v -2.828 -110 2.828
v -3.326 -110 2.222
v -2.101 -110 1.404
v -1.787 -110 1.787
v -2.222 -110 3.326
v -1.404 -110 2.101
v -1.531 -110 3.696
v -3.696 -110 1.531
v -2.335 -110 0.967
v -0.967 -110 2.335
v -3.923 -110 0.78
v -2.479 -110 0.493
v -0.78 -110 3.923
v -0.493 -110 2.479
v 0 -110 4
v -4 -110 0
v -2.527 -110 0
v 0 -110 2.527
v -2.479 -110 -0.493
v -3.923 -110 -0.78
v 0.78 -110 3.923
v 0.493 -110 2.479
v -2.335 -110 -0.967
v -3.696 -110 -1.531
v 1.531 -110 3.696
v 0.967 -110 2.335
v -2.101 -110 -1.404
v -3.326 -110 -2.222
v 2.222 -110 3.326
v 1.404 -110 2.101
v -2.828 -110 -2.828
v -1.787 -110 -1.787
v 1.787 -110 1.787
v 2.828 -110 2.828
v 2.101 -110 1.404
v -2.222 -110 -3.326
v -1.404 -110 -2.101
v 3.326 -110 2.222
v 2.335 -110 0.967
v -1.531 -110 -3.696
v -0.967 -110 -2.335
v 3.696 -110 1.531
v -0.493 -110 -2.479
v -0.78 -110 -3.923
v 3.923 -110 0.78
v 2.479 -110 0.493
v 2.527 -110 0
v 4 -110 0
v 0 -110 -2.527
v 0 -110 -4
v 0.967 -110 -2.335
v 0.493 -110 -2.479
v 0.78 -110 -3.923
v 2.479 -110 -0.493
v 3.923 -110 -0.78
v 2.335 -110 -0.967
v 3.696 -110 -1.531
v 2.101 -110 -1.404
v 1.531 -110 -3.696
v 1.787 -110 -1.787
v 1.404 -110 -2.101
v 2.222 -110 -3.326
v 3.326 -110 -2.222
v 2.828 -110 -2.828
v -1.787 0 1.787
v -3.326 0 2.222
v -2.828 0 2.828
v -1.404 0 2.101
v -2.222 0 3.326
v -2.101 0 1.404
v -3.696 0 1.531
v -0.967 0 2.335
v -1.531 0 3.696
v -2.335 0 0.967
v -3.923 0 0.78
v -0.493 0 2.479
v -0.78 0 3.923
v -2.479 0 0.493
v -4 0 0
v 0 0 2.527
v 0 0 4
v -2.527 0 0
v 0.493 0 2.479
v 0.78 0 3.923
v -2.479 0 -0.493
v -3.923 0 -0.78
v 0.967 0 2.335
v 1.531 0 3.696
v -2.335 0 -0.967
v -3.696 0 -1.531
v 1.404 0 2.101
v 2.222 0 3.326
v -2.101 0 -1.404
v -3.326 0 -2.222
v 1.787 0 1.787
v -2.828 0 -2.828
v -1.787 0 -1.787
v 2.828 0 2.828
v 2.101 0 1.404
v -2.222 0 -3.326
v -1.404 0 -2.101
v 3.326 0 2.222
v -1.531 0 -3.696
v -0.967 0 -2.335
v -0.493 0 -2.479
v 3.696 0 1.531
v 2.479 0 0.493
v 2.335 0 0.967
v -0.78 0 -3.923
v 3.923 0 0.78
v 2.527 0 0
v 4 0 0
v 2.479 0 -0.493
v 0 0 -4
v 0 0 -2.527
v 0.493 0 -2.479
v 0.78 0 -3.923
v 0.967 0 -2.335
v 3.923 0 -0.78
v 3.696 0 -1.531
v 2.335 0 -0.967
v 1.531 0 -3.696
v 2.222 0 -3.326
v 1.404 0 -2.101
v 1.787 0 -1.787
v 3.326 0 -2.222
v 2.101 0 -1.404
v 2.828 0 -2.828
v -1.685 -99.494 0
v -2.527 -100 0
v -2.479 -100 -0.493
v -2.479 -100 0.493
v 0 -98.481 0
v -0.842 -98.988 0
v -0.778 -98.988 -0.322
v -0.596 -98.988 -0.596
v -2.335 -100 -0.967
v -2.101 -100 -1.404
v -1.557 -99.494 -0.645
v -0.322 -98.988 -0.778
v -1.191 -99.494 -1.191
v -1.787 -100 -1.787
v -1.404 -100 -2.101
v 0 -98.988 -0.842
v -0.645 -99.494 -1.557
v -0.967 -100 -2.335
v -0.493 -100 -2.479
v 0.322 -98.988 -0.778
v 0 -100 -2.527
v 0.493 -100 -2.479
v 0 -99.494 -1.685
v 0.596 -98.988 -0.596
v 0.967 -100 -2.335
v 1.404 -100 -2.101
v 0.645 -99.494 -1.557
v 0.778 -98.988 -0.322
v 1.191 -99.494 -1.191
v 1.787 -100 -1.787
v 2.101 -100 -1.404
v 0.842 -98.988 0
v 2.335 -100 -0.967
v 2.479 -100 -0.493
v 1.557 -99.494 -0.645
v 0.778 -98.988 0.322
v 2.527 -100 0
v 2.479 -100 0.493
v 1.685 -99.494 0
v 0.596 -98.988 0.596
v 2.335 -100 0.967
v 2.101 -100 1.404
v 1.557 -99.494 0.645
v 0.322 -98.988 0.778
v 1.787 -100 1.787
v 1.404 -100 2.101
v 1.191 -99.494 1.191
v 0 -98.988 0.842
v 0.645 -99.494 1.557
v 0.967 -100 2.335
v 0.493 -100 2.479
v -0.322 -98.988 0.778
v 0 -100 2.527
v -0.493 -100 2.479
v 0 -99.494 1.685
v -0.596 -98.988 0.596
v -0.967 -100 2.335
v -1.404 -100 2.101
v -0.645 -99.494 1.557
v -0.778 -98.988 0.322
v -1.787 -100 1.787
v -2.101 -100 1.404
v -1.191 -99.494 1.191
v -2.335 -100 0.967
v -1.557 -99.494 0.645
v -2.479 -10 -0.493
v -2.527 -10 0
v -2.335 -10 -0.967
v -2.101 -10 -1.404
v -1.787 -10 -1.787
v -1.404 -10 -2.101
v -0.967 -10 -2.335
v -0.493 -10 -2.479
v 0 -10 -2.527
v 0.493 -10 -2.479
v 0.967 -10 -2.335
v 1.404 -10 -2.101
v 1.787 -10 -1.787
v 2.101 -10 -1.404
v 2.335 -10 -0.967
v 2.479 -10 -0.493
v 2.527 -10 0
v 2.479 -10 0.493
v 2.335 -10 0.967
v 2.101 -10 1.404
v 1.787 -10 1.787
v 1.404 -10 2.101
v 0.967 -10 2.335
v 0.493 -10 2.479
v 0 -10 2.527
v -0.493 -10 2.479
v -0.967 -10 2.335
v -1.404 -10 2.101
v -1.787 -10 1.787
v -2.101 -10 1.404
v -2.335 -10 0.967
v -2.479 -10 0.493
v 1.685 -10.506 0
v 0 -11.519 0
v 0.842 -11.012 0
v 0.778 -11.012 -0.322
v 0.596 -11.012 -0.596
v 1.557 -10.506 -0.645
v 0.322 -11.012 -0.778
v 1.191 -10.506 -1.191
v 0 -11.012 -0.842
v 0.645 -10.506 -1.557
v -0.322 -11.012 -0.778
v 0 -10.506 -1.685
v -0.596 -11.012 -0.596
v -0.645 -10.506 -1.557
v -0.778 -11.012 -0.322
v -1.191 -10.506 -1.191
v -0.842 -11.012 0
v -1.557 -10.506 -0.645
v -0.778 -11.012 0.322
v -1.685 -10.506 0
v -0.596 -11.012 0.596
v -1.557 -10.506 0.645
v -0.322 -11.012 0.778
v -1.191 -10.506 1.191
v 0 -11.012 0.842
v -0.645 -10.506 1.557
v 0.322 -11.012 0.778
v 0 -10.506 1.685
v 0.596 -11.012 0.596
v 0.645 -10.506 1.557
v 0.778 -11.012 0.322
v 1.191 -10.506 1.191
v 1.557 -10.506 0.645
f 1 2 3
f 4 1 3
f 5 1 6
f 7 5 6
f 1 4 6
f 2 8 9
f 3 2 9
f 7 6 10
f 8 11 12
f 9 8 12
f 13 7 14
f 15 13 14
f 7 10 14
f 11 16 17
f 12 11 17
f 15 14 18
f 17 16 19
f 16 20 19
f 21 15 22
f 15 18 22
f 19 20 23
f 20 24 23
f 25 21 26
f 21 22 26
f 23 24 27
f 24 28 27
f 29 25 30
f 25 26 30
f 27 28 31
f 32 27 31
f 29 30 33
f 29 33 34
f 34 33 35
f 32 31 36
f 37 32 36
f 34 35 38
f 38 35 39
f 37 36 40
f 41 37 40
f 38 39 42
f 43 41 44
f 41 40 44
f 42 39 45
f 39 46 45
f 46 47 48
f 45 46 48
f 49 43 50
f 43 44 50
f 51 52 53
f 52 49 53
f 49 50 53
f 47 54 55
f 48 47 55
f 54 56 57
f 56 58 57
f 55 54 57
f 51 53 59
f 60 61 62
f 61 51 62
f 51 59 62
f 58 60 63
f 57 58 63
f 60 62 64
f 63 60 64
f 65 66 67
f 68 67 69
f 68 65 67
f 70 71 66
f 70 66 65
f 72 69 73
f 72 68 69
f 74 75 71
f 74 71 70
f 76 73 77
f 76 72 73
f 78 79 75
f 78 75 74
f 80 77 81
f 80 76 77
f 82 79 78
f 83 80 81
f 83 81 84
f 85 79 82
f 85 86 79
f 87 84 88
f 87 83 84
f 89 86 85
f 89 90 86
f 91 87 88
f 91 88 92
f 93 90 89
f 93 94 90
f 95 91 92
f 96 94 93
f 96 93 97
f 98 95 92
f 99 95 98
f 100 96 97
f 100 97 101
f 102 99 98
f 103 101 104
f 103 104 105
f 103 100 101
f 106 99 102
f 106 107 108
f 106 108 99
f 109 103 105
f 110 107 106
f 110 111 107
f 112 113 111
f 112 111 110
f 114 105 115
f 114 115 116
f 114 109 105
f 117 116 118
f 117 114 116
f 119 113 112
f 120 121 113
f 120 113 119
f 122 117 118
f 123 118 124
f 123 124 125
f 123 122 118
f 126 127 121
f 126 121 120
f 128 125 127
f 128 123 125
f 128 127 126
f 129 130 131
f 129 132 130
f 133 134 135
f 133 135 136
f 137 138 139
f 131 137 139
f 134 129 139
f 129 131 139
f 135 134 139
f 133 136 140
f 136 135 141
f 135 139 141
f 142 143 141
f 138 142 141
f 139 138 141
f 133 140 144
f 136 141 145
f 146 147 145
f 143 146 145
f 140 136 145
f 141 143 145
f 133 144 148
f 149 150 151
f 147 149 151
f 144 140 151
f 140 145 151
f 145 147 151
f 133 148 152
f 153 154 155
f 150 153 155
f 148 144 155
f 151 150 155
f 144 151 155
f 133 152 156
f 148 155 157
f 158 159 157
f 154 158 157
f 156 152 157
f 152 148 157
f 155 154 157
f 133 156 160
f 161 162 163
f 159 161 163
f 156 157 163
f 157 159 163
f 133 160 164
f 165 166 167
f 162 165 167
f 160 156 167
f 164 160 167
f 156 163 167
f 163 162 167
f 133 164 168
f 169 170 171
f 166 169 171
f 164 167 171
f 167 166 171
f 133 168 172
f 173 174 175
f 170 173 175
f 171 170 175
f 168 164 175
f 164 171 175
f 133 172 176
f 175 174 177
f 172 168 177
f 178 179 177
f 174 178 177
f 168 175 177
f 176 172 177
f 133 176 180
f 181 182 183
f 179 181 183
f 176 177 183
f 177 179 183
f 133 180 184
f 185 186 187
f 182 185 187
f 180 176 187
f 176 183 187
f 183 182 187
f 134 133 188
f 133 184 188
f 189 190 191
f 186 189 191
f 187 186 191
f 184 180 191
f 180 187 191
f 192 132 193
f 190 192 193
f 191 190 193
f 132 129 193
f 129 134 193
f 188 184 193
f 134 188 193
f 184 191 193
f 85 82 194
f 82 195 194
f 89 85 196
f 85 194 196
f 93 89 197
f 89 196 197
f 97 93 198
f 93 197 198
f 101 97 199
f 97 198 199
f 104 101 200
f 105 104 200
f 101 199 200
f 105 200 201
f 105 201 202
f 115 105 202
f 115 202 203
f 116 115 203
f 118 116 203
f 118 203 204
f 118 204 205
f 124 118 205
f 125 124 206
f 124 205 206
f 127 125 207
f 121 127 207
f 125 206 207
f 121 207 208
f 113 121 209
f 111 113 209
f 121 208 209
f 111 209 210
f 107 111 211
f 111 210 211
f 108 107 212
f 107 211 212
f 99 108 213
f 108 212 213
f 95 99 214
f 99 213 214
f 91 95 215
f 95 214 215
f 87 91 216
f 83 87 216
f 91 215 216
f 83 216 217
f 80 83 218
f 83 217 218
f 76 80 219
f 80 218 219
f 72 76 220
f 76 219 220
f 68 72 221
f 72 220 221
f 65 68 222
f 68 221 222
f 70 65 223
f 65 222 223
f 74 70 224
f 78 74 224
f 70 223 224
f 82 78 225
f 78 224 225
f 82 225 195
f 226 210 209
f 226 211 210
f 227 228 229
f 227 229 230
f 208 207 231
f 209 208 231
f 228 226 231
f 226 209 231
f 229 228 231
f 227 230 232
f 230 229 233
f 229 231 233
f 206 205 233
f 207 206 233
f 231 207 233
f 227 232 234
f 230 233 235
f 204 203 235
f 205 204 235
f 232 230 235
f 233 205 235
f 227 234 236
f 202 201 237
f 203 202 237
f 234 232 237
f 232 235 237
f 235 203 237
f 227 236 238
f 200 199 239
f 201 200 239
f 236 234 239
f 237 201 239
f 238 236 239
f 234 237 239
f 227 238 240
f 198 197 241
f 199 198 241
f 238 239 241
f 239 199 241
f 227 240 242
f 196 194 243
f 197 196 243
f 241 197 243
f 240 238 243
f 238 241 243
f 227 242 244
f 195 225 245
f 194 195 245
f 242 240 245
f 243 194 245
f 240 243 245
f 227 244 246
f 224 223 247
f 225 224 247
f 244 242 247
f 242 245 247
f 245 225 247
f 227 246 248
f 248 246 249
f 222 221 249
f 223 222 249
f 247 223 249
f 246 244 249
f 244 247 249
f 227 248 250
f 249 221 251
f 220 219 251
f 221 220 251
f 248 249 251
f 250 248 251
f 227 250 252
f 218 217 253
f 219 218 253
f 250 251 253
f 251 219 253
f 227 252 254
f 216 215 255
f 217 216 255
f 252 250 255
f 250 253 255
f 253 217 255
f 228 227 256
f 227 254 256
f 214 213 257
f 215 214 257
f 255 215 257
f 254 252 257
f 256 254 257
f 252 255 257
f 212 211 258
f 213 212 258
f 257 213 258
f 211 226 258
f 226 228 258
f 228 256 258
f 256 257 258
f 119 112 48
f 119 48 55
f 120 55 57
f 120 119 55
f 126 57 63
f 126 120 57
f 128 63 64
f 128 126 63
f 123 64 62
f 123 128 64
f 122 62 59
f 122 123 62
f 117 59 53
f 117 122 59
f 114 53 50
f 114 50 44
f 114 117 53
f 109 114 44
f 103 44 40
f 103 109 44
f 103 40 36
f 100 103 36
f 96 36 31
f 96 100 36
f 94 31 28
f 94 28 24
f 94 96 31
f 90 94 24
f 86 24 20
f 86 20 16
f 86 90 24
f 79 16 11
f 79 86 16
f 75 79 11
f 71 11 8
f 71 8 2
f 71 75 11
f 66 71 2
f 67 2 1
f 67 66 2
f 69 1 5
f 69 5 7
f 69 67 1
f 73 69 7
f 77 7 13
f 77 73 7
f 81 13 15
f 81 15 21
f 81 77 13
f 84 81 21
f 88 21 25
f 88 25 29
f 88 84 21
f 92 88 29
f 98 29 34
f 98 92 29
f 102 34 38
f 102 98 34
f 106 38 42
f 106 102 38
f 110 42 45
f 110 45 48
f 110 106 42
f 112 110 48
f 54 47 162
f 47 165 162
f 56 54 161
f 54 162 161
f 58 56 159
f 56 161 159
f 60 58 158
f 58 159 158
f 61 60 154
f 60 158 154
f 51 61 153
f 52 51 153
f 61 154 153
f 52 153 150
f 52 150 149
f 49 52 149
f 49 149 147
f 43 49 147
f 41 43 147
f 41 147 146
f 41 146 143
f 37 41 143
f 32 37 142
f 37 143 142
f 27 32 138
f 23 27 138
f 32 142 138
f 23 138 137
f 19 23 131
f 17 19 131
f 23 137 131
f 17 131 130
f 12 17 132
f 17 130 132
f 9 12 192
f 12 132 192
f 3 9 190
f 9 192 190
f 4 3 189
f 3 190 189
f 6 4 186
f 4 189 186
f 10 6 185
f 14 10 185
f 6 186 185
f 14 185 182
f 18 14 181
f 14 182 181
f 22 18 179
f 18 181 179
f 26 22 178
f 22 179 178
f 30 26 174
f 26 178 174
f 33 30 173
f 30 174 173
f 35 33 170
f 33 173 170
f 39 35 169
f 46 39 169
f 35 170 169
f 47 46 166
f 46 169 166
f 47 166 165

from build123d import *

# Parameters (mm, degrees)
SKETCH2_R                      = 4
BOSS_EXTRUDE1_DEPTH            = 110
F_8_0_199_DIAMETER_HOLE3_D     = 5.0546
F_8_0_199_DIAMETER_HOLE3_DEPTH = 10
F_8_0_199_DIAMETER_HOLE3_TIP   = 1.518555042
F_8_0_199_DIAMETER_HOLE4_D     = 5.0546
F_8_0_199_DIAMETER_HOLE4_DEPTH = 10
F_8_0_199_DIAMETER_HOLE4_TIP   = 1.518555042


with BuildPart() as part:
    # Sketch2 → Boss-Extrude1 (new body)
    with BuildSketch(Plane(origin=(0, 0, 0), x_dir=(1, 0, 0), z_dir=(0, 1, 0))):
        Circle(SKETCH2_R)
    extrude(amount=-BOSS_EXTRUDE1_DEPTH)

    # #8 (0.199) Diameter Hole3
    with Locations(Plane(origin=(0, 0, 0), x_dir=(1, 0, 0), z_dir=(0, 1, 0))):
        with Locations((0, 0)):
            Hole(F_8_0_199_DIAMETER_HOLE3_D / 2, depth=F_8_0_199_DIAMETER_HOLE3_DEPTH)
            with Locations((0, 0, -(F_8_0_199_DIAMETER_HOLE3_DEPTH + F_8_0_199_DIAMETER_HOLE3_TIP / 2))):  # 118° drill point
                Cone(0, F_8_0_199_DIAMETER_HOLE3_D / 2, F_8_0_199_DIAMETER_HOLE3_TIP, mode=Mode.SUBTRACT)

    # #8 (0.199) Diameter Hole4
    with Locations(Plane(origin=(0, -110, 0), x_dir=(-1, 0, 0), z_dir=(0, -1, 0))):
        with Locations((0, 0)):
            Hole(F_8_0_199_DIAMETER_HOLE4_D / 2, depth=F_8_0_199_DIAMETER_HOLE4_DEPTH)
            with Locations((0, 0, -(F_8_0_199_DIAMETER_HOLE4_DEPTH + F_8_0_199_DIAMETER_HOLE4_TIP / 2))):  # 118° drill point
                Cone(0, F_8_0_199_DIAMETER_HOLE4_D / 2, F_8_0_199_DIAMETER_HOLE4_TIP, mode=Mode.SUBTRACT)


solid = part.part
